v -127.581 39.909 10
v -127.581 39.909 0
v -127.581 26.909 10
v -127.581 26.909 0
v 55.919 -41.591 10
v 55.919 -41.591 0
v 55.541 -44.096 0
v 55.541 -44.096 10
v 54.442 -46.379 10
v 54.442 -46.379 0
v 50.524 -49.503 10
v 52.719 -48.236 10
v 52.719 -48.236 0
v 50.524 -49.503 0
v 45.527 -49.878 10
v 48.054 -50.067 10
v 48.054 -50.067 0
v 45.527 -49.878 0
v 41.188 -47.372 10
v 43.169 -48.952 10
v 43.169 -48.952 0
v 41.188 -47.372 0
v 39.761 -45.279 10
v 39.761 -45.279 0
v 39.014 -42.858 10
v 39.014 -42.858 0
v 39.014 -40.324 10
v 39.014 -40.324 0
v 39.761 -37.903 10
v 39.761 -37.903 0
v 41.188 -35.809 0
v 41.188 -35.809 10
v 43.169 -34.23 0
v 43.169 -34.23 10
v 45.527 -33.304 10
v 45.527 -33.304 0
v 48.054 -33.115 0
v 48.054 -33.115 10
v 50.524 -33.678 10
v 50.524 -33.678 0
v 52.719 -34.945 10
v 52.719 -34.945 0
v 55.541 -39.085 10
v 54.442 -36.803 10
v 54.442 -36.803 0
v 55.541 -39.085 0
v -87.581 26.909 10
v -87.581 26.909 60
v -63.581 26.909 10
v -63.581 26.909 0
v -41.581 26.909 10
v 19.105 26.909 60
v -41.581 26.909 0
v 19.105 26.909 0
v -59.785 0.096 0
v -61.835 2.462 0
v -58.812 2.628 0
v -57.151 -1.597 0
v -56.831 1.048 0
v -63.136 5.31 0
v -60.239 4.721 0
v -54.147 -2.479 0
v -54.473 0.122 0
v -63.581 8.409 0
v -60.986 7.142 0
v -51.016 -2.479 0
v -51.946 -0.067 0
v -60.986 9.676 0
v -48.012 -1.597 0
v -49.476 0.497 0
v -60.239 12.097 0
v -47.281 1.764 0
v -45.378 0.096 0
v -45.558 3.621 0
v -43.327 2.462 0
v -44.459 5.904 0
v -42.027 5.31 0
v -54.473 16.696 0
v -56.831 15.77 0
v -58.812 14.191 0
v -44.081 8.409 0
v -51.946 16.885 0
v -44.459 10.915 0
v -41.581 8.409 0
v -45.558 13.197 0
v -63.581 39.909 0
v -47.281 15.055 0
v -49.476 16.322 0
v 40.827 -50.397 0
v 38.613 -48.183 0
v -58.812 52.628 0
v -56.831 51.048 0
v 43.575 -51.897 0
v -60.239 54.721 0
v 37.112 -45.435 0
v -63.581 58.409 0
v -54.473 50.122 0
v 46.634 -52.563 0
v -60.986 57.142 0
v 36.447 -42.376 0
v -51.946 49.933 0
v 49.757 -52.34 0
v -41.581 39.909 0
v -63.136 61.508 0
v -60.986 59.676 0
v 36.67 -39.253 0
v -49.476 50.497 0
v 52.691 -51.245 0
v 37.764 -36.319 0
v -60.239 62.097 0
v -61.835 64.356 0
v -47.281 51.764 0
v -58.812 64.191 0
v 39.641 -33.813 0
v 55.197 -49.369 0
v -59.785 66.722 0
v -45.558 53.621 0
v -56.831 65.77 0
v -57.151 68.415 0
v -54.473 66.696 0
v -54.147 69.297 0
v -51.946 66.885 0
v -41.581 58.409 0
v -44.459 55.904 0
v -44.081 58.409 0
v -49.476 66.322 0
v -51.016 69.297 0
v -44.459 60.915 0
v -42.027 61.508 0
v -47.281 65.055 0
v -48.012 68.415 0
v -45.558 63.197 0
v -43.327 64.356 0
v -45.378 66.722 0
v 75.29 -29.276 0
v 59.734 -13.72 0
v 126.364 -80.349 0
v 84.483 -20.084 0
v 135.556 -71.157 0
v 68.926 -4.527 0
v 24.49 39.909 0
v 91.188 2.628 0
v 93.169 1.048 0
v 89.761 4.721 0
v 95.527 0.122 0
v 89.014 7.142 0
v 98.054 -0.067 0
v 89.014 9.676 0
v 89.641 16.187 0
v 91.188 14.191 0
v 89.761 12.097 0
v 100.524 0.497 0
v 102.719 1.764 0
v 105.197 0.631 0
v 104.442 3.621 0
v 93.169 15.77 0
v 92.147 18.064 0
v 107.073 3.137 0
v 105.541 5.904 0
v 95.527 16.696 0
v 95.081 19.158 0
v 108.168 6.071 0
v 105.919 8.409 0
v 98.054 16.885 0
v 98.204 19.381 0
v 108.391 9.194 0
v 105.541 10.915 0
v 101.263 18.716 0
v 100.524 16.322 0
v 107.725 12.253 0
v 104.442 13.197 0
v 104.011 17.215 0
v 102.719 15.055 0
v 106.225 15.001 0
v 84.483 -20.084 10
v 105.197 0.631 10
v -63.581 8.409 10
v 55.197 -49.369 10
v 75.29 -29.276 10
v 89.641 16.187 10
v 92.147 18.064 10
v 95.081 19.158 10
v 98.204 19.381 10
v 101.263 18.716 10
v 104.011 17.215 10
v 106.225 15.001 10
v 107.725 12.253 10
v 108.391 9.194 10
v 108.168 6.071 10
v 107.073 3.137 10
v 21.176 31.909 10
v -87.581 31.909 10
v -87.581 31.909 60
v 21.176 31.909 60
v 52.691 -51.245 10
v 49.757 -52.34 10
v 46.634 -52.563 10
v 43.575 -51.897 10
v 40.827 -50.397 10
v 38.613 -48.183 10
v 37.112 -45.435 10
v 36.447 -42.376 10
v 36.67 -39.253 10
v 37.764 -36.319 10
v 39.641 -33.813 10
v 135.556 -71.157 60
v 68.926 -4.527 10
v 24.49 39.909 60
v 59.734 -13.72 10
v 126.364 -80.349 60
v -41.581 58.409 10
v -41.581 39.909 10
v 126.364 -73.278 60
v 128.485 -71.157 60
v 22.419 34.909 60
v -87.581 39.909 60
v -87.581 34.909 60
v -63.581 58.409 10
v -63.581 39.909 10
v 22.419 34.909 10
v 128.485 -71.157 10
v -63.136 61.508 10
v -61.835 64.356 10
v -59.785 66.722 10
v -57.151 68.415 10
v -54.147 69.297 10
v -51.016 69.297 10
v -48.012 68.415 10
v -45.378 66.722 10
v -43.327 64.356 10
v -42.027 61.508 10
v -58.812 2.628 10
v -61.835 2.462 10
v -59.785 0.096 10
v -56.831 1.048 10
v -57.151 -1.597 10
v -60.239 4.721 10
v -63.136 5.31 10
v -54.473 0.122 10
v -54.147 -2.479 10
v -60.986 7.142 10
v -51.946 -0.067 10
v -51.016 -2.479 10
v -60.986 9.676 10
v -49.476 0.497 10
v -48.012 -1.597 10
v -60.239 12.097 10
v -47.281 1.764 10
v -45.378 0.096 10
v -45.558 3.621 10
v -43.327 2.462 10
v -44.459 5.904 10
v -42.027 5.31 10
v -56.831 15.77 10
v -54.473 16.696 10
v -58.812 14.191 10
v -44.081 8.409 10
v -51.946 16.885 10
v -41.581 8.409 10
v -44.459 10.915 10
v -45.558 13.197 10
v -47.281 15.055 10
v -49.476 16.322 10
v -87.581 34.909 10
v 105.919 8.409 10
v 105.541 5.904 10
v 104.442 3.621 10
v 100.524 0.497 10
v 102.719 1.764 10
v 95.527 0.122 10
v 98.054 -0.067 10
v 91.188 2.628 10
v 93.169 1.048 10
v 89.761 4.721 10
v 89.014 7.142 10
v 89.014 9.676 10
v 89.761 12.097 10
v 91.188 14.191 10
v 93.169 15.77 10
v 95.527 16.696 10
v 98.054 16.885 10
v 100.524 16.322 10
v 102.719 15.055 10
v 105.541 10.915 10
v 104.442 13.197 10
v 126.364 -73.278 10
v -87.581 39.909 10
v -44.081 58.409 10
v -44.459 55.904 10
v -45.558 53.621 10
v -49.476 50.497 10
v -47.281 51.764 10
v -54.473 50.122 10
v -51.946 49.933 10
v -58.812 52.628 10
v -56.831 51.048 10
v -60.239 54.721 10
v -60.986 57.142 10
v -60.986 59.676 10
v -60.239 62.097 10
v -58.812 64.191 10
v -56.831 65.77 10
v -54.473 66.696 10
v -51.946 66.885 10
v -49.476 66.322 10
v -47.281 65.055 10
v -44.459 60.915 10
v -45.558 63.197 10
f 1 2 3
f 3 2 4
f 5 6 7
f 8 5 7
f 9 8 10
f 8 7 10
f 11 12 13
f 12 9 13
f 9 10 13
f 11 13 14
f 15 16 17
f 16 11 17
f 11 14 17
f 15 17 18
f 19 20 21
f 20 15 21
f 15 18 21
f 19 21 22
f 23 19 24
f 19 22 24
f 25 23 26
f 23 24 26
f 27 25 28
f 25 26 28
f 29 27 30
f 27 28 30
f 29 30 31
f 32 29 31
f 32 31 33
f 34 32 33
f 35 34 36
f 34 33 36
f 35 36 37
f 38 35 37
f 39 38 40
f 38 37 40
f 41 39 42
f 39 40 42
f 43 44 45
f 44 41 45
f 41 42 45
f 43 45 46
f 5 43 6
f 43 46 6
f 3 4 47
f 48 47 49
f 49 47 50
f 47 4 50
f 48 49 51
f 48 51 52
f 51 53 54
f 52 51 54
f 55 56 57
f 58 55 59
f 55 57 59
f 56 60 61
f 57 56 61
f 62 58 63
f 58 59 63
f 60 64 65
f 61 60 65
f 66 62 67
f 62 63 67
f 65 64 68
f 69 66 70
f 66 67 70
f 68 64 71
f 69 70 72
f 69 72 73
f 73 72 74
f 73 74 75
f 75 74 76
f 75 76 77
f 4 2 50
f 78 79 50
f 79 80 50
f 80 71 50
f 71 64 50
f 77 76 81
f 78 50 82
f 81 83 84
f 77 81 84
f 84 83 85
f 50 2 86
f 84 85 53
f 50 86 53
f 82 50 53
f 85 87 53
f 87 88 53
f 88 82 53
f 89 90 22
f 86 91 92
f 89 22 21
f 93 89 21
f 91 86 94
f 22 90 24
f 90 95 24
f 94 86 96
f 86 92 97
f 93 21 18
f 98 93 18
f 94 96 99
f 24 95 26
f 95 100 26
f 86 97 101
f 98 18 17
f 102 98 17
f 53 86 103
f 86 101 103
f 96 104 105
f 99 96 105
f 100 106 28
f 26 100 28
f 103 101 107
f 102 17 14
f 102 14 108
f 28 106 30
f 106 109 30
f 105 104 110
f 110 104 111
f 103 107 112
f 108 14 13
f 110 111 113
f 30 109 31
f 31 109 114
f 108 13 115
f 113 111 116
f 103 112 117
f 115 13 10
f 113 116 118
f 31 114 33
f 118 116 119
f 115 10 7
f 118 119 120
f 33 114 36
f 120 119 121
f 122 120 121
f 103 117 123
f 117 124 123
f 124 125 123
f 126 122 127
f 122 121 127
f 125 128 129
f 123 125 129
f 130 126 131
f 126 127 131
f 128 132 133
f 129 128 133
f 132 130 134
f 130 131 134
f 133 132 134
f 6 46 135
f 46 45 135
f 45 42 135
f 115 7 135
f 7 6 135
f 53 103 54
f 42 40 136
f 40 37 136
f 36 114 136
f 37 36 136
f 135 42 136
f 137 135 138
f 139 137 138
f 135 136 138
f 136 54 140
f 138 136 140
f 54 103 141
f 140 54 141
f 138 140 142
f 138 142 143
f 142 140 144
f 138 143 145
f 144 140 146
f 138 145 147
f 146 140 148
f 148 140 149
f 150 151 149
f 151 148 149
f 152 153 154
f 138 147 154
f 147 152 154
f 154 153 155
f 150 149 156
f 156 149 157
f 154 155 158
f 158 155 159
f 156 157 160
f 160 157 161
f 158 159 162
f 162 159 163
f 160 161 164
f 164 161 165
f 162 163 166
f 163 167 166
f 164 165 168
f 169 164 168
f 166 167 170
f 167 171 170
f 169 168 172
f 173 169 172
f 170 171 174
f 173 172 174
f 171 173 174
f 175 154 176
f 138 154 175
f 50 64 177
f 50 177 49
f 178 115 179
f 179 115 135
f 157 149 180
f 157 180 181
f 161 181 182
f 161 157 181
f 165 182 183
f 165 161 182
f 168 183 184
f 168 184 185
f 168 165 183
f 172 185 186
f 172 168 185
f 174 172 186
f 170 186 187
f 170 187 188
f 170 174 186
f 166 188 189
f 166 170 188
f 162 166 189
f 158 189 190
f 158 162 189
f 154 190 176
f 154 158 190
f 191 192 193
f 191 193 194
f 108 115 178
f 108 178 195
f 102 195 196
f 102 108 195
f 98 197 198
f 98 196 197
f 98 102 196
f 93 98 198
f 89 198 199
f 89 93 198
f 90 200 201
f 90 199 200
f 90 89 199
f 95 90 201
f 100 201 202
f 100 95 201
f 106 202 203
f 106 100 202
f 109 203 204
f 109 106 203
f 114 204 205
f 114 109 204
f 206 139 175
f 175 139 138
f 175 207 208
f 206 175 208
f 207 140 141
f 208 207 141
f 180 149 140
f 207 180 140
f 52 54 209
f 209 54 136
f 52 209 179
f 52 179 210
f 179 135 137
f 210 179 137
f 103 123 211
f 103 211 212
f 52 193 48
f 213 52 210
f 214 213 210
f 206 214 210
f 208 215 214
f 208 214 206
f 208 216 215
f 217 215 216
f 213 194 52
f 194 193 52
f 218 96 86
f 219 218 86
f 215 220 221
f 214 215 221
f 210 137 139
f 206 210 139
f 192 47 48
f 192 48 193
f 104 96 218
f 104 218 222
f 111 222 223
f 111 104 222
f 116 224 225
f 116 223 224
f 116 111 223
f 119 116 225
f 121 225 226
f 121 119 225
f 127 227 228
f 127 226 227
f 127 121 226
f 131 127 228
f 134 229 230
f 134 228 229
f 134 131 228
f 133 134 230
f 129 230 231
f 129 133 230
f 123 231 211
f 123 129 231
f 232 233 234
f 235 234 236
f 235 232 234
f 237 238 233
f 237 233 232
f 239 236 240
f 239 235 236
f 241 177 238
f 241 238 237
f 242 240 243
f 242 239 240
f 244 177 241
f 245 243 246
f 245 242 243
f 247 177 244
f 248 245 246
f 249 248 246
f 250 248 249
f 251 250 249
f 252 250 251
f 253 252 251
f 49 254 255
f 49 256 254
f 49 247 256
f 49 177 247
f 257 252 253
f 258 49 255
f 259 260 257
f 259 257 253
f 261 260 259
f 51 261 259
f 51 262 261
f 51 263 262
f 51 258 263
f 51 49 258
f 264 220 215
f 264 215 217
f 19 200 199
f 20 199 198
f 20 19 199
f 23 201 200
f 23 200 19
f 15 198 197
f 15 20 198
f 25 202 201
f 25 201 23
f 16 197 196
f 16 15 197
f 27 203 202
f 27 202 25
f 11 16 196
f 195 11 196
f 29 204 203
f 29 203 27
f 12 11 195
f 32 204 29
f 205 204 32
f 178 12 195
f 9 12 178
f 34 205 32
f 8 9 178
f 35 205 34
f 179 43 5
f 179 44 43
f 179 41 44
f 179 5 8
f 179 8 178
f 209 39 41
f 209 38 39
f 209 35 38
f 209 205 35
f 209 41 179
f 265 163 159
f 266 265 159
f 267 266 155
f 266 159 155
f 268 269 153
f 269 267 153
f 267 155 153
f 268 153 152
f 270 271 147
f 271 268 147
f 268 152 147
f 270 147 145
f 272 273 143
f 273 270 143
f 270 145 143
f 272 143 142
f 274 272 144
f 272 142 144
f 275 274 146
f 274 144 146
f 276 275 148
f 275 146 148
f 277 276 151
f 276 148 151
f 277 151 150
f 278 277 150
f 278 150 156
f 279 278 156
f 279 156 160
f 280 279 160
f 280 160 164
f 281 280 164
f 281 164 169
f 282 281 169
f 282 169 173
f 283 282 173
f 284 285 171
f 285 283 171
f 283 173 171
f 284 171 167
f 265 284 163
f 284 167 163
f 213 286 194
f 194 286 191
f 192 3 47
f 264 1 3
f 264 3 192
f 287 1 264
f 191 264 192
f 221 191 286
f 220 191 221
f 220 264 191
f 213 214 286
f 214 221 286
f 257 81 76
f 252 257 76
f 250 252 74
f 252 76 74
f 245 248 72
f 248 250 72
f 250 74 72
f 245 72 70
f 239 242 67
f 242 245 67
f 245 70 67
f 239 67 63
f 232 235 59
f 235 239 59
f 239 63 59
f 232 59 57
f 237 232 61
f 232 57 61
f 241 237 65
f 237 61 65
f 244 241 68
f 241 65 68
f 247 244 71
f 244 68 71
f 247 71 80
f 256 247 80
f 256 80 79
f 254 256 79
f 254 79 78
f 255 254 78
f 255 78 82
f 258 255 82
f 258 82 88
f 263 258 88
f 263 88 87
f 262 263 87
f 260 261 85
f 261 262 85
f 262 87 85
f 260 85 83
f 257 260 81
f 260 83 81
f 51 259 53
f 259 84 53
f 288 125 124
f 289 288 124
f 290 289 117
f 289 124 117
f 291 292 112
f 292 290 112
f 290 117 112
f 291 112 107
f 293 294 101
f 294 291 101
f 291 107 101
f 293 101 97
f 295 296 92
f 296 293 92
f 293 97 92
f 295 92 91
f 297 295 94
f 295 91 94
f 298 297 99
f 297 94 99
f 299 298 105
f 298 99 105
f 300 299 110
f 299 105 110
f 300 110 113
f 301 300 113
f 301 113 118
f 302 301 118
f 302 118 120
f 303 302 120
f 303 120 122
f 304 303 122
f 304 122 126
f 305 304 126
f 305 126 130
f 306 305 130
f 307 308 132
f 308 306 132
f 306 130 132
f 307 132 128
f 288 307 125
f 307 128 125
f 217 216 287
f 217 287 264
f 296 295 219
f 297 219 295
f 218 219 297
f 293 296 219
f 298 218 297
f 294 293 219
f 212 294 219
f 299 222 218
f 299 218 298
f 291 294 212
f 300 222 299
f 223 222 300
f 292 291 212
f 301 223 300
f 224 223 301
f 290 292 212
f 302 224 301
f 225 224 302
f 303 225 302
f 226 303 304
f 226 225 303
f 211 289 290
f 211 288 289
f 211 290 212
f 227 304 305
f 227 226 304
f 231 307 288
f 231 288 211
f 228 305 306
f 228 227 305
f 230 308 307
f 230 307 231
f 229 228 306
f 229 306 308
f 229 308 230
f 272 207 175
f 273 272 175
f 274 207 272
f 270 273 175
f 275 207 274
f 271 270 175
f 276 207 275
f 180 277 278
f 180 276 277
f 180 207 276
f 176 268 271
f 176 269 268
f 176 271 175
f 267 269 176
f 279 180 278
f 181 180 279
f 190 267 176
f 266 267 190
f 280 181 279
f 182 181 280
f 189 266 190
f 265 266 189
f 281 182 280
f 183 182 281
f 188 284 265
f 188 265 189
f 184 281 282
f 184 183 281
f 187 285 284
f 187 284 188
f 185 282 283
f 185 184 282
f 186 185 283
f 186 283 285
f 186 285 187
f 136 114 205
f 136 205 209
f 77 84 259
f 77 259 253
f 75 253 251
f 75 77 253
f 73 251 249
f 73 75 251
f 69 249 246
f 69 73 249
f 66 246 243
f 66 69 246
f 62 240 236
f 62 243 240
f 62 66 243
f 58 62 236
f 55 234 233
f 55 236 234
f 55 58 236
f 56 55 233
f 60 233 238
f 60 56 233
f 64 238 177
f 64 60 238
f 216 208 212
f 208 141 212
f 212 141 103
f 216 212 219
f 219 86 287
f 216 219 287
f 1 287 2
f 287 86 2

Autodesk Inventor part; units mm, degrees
ref_plane "YZ Plane" through (0, 0, 0) normal (1, 0, 0) x (0, 1, 0)
ref_plane "XZ Plane" through (0, 0, 0) normal (0, 1, 0) x (-1, 0, 0)
ref_plane "XY Plane" through (0, 0, 0) normal (0, 0, 1) x (1, 0, 0)
sketch "Sketch1" plane through (0, 0, 0) normal (0, 0, 1) x (1, 0, 0)
  line L0 (-127.5811, 34.9091) -> (-127.5811, 31.9091)
  line L1 (-127.5811, 34.9091) -> (-127.5811, 39.9091)
  line L2 (-127.5811, 31.9091) -> (-127.5811, 26.9091)
  line L3 (-127.5811, 26.9091) -> (19.1052, 26.9091)
  line L4 (-127.5811, 31.9091) -> (21.1763, 31.9091)
  line L5 (22.4189, 34.9091) -> (-127.5811, 34.9091)
  line L6 (24.49, 39.9091) -> (-127.5811, 39.9091)
  line L7 (126.3636, -73.2783) -> (21.1763, 31.9091)
  line L8 (22.4189, 34.9091) -> (128.4849, -71.157)
  line L9 (128.4849, -71.157) -> (126.3636, -73.2783)
  line L10 (19.1052, 26.9091) -> (126.3636, -80.3493)
  line L11 (135.556, -71.157) -> (24.49, 39.9091)
  line L12 (126.3636, -80.3493) -> (135.556, -71.157)
  line L13 (-87.5811, 26.9091) -> (-87.5811, 31.9091)
  line L14 (105.1971, 0.6309) -> (84.4826, -20.0836)
  circle A0 centre (97.4189, 8.4091) radius 8.5
  circle A1 centre (97.4189, 8.4091) radius 11
  line L15 (89.6407, 16.1872) -> (68.9263, -4.5272)
  line L16 (55.1971, -49.3691) -> (75.2902, -29.276)
  line L17 (39.6407, -33.8128) -> (59.7339, -13.7196)
  circle A2 centre (47.4189, -41.5909) radius 8.5
  circle A3 centre (47.4189, -41.5909) radius 11
  line L18 (-41.5811, 8.4091) -> (-41.5811, 26.9091)
  line L19 (-63.5811, 8.4091) -> (-63.5811, 26.9091)
  circle A4 centre (-52.5811, 8.4091) radius 8.5
  circle A5 centre (-52.5811, 8.4091) radius 11
  line L20 (-41.5811, 58.4091) -> (-41.5811, 39.9091)
  circle A6 centre (-52.5811, 58.4091) radius 8.5
  circle A7 centre (-52.5811, 58.4091) radius 11
  line L21 (-63.5811, 58.4091) -> (-63.5811, 39.9091)
  line L22 (-87.5811, 34.9091) -> (-87.5811, 39.9091)
  point P0 (0, 0)
  point P1 (-127.5811, 33.4091)
  point P2 (-127.5811, 33.4091)
  point P3 (-127.5811, 29.4091)
  point P4 (-87.5811, 29.4091)
  point P5 (-51.5456, 39.9091)
  dimension "d0" = 3
  dimension "d1" = 3
  dimension "d2" = 5
  dimension "d3" = 5
  dimension "d4" = 5
  dimension "d5" = 3
  dimension "d6" = 5
  dimension "d7" = 150
  dimension "d8" = 148.7574
  dimension "d9" = 148.7574
  dimension "d10" = 150
  dimension "d11" = 13
  dimension "d12" = 5
  dimension "d13" = 40
  dimension "d14" = 45
  dimension "d15" = 45
  dimension "d16" = 86
  dimension "d17" = 64
extrude "Extrusion1" add sketch "Sketch1" along normal blind 10 contours L5 L8 L9 L7 L4 L0 | L4 L13 L3 L2 | L21 A7 L20 L6 | L3 L18 A5 L19 | A7 | A5 | L15 A1 L14 L11 | L10 L16 A3 L17 | A1 | A3
extrude "Extrusion2" add sketch "Sketch1" along normal blind 60 contours L1 L6 L22 L5 | L22 L6 L11 L12 L10 L3 L13 L4 L7 L9 L8 L5
sketch "Sketch2" plane through (0, 0, 60) normal (0, 0, 1) x (1, 0, 0)
  line L0 (-127.5811, 39.9091) -> (-127.5811, 34.9091) projected
  line L1 (-127.5811, 34.9091) -> (22.4189, 34.9091) projected
  line L2 (-127.5811, 39.9091) -> (-87.5811, 39.9091)
  line L3 (-87.5811, 39.9091) -> (-87.5811, 34.9091)
  line L4 (-87.5811, 34.9091) -> (-127.5811, 34.9091)
  line L5 (-127.5811, 34.9091) -> (-127.5811, 39.9091)
  point P0 (0, 0)
  dimension "d22" = 40
extrude "Extrusion3" cut sketch "Sketch2" against normal blind 50
properties part number "hold_right"
